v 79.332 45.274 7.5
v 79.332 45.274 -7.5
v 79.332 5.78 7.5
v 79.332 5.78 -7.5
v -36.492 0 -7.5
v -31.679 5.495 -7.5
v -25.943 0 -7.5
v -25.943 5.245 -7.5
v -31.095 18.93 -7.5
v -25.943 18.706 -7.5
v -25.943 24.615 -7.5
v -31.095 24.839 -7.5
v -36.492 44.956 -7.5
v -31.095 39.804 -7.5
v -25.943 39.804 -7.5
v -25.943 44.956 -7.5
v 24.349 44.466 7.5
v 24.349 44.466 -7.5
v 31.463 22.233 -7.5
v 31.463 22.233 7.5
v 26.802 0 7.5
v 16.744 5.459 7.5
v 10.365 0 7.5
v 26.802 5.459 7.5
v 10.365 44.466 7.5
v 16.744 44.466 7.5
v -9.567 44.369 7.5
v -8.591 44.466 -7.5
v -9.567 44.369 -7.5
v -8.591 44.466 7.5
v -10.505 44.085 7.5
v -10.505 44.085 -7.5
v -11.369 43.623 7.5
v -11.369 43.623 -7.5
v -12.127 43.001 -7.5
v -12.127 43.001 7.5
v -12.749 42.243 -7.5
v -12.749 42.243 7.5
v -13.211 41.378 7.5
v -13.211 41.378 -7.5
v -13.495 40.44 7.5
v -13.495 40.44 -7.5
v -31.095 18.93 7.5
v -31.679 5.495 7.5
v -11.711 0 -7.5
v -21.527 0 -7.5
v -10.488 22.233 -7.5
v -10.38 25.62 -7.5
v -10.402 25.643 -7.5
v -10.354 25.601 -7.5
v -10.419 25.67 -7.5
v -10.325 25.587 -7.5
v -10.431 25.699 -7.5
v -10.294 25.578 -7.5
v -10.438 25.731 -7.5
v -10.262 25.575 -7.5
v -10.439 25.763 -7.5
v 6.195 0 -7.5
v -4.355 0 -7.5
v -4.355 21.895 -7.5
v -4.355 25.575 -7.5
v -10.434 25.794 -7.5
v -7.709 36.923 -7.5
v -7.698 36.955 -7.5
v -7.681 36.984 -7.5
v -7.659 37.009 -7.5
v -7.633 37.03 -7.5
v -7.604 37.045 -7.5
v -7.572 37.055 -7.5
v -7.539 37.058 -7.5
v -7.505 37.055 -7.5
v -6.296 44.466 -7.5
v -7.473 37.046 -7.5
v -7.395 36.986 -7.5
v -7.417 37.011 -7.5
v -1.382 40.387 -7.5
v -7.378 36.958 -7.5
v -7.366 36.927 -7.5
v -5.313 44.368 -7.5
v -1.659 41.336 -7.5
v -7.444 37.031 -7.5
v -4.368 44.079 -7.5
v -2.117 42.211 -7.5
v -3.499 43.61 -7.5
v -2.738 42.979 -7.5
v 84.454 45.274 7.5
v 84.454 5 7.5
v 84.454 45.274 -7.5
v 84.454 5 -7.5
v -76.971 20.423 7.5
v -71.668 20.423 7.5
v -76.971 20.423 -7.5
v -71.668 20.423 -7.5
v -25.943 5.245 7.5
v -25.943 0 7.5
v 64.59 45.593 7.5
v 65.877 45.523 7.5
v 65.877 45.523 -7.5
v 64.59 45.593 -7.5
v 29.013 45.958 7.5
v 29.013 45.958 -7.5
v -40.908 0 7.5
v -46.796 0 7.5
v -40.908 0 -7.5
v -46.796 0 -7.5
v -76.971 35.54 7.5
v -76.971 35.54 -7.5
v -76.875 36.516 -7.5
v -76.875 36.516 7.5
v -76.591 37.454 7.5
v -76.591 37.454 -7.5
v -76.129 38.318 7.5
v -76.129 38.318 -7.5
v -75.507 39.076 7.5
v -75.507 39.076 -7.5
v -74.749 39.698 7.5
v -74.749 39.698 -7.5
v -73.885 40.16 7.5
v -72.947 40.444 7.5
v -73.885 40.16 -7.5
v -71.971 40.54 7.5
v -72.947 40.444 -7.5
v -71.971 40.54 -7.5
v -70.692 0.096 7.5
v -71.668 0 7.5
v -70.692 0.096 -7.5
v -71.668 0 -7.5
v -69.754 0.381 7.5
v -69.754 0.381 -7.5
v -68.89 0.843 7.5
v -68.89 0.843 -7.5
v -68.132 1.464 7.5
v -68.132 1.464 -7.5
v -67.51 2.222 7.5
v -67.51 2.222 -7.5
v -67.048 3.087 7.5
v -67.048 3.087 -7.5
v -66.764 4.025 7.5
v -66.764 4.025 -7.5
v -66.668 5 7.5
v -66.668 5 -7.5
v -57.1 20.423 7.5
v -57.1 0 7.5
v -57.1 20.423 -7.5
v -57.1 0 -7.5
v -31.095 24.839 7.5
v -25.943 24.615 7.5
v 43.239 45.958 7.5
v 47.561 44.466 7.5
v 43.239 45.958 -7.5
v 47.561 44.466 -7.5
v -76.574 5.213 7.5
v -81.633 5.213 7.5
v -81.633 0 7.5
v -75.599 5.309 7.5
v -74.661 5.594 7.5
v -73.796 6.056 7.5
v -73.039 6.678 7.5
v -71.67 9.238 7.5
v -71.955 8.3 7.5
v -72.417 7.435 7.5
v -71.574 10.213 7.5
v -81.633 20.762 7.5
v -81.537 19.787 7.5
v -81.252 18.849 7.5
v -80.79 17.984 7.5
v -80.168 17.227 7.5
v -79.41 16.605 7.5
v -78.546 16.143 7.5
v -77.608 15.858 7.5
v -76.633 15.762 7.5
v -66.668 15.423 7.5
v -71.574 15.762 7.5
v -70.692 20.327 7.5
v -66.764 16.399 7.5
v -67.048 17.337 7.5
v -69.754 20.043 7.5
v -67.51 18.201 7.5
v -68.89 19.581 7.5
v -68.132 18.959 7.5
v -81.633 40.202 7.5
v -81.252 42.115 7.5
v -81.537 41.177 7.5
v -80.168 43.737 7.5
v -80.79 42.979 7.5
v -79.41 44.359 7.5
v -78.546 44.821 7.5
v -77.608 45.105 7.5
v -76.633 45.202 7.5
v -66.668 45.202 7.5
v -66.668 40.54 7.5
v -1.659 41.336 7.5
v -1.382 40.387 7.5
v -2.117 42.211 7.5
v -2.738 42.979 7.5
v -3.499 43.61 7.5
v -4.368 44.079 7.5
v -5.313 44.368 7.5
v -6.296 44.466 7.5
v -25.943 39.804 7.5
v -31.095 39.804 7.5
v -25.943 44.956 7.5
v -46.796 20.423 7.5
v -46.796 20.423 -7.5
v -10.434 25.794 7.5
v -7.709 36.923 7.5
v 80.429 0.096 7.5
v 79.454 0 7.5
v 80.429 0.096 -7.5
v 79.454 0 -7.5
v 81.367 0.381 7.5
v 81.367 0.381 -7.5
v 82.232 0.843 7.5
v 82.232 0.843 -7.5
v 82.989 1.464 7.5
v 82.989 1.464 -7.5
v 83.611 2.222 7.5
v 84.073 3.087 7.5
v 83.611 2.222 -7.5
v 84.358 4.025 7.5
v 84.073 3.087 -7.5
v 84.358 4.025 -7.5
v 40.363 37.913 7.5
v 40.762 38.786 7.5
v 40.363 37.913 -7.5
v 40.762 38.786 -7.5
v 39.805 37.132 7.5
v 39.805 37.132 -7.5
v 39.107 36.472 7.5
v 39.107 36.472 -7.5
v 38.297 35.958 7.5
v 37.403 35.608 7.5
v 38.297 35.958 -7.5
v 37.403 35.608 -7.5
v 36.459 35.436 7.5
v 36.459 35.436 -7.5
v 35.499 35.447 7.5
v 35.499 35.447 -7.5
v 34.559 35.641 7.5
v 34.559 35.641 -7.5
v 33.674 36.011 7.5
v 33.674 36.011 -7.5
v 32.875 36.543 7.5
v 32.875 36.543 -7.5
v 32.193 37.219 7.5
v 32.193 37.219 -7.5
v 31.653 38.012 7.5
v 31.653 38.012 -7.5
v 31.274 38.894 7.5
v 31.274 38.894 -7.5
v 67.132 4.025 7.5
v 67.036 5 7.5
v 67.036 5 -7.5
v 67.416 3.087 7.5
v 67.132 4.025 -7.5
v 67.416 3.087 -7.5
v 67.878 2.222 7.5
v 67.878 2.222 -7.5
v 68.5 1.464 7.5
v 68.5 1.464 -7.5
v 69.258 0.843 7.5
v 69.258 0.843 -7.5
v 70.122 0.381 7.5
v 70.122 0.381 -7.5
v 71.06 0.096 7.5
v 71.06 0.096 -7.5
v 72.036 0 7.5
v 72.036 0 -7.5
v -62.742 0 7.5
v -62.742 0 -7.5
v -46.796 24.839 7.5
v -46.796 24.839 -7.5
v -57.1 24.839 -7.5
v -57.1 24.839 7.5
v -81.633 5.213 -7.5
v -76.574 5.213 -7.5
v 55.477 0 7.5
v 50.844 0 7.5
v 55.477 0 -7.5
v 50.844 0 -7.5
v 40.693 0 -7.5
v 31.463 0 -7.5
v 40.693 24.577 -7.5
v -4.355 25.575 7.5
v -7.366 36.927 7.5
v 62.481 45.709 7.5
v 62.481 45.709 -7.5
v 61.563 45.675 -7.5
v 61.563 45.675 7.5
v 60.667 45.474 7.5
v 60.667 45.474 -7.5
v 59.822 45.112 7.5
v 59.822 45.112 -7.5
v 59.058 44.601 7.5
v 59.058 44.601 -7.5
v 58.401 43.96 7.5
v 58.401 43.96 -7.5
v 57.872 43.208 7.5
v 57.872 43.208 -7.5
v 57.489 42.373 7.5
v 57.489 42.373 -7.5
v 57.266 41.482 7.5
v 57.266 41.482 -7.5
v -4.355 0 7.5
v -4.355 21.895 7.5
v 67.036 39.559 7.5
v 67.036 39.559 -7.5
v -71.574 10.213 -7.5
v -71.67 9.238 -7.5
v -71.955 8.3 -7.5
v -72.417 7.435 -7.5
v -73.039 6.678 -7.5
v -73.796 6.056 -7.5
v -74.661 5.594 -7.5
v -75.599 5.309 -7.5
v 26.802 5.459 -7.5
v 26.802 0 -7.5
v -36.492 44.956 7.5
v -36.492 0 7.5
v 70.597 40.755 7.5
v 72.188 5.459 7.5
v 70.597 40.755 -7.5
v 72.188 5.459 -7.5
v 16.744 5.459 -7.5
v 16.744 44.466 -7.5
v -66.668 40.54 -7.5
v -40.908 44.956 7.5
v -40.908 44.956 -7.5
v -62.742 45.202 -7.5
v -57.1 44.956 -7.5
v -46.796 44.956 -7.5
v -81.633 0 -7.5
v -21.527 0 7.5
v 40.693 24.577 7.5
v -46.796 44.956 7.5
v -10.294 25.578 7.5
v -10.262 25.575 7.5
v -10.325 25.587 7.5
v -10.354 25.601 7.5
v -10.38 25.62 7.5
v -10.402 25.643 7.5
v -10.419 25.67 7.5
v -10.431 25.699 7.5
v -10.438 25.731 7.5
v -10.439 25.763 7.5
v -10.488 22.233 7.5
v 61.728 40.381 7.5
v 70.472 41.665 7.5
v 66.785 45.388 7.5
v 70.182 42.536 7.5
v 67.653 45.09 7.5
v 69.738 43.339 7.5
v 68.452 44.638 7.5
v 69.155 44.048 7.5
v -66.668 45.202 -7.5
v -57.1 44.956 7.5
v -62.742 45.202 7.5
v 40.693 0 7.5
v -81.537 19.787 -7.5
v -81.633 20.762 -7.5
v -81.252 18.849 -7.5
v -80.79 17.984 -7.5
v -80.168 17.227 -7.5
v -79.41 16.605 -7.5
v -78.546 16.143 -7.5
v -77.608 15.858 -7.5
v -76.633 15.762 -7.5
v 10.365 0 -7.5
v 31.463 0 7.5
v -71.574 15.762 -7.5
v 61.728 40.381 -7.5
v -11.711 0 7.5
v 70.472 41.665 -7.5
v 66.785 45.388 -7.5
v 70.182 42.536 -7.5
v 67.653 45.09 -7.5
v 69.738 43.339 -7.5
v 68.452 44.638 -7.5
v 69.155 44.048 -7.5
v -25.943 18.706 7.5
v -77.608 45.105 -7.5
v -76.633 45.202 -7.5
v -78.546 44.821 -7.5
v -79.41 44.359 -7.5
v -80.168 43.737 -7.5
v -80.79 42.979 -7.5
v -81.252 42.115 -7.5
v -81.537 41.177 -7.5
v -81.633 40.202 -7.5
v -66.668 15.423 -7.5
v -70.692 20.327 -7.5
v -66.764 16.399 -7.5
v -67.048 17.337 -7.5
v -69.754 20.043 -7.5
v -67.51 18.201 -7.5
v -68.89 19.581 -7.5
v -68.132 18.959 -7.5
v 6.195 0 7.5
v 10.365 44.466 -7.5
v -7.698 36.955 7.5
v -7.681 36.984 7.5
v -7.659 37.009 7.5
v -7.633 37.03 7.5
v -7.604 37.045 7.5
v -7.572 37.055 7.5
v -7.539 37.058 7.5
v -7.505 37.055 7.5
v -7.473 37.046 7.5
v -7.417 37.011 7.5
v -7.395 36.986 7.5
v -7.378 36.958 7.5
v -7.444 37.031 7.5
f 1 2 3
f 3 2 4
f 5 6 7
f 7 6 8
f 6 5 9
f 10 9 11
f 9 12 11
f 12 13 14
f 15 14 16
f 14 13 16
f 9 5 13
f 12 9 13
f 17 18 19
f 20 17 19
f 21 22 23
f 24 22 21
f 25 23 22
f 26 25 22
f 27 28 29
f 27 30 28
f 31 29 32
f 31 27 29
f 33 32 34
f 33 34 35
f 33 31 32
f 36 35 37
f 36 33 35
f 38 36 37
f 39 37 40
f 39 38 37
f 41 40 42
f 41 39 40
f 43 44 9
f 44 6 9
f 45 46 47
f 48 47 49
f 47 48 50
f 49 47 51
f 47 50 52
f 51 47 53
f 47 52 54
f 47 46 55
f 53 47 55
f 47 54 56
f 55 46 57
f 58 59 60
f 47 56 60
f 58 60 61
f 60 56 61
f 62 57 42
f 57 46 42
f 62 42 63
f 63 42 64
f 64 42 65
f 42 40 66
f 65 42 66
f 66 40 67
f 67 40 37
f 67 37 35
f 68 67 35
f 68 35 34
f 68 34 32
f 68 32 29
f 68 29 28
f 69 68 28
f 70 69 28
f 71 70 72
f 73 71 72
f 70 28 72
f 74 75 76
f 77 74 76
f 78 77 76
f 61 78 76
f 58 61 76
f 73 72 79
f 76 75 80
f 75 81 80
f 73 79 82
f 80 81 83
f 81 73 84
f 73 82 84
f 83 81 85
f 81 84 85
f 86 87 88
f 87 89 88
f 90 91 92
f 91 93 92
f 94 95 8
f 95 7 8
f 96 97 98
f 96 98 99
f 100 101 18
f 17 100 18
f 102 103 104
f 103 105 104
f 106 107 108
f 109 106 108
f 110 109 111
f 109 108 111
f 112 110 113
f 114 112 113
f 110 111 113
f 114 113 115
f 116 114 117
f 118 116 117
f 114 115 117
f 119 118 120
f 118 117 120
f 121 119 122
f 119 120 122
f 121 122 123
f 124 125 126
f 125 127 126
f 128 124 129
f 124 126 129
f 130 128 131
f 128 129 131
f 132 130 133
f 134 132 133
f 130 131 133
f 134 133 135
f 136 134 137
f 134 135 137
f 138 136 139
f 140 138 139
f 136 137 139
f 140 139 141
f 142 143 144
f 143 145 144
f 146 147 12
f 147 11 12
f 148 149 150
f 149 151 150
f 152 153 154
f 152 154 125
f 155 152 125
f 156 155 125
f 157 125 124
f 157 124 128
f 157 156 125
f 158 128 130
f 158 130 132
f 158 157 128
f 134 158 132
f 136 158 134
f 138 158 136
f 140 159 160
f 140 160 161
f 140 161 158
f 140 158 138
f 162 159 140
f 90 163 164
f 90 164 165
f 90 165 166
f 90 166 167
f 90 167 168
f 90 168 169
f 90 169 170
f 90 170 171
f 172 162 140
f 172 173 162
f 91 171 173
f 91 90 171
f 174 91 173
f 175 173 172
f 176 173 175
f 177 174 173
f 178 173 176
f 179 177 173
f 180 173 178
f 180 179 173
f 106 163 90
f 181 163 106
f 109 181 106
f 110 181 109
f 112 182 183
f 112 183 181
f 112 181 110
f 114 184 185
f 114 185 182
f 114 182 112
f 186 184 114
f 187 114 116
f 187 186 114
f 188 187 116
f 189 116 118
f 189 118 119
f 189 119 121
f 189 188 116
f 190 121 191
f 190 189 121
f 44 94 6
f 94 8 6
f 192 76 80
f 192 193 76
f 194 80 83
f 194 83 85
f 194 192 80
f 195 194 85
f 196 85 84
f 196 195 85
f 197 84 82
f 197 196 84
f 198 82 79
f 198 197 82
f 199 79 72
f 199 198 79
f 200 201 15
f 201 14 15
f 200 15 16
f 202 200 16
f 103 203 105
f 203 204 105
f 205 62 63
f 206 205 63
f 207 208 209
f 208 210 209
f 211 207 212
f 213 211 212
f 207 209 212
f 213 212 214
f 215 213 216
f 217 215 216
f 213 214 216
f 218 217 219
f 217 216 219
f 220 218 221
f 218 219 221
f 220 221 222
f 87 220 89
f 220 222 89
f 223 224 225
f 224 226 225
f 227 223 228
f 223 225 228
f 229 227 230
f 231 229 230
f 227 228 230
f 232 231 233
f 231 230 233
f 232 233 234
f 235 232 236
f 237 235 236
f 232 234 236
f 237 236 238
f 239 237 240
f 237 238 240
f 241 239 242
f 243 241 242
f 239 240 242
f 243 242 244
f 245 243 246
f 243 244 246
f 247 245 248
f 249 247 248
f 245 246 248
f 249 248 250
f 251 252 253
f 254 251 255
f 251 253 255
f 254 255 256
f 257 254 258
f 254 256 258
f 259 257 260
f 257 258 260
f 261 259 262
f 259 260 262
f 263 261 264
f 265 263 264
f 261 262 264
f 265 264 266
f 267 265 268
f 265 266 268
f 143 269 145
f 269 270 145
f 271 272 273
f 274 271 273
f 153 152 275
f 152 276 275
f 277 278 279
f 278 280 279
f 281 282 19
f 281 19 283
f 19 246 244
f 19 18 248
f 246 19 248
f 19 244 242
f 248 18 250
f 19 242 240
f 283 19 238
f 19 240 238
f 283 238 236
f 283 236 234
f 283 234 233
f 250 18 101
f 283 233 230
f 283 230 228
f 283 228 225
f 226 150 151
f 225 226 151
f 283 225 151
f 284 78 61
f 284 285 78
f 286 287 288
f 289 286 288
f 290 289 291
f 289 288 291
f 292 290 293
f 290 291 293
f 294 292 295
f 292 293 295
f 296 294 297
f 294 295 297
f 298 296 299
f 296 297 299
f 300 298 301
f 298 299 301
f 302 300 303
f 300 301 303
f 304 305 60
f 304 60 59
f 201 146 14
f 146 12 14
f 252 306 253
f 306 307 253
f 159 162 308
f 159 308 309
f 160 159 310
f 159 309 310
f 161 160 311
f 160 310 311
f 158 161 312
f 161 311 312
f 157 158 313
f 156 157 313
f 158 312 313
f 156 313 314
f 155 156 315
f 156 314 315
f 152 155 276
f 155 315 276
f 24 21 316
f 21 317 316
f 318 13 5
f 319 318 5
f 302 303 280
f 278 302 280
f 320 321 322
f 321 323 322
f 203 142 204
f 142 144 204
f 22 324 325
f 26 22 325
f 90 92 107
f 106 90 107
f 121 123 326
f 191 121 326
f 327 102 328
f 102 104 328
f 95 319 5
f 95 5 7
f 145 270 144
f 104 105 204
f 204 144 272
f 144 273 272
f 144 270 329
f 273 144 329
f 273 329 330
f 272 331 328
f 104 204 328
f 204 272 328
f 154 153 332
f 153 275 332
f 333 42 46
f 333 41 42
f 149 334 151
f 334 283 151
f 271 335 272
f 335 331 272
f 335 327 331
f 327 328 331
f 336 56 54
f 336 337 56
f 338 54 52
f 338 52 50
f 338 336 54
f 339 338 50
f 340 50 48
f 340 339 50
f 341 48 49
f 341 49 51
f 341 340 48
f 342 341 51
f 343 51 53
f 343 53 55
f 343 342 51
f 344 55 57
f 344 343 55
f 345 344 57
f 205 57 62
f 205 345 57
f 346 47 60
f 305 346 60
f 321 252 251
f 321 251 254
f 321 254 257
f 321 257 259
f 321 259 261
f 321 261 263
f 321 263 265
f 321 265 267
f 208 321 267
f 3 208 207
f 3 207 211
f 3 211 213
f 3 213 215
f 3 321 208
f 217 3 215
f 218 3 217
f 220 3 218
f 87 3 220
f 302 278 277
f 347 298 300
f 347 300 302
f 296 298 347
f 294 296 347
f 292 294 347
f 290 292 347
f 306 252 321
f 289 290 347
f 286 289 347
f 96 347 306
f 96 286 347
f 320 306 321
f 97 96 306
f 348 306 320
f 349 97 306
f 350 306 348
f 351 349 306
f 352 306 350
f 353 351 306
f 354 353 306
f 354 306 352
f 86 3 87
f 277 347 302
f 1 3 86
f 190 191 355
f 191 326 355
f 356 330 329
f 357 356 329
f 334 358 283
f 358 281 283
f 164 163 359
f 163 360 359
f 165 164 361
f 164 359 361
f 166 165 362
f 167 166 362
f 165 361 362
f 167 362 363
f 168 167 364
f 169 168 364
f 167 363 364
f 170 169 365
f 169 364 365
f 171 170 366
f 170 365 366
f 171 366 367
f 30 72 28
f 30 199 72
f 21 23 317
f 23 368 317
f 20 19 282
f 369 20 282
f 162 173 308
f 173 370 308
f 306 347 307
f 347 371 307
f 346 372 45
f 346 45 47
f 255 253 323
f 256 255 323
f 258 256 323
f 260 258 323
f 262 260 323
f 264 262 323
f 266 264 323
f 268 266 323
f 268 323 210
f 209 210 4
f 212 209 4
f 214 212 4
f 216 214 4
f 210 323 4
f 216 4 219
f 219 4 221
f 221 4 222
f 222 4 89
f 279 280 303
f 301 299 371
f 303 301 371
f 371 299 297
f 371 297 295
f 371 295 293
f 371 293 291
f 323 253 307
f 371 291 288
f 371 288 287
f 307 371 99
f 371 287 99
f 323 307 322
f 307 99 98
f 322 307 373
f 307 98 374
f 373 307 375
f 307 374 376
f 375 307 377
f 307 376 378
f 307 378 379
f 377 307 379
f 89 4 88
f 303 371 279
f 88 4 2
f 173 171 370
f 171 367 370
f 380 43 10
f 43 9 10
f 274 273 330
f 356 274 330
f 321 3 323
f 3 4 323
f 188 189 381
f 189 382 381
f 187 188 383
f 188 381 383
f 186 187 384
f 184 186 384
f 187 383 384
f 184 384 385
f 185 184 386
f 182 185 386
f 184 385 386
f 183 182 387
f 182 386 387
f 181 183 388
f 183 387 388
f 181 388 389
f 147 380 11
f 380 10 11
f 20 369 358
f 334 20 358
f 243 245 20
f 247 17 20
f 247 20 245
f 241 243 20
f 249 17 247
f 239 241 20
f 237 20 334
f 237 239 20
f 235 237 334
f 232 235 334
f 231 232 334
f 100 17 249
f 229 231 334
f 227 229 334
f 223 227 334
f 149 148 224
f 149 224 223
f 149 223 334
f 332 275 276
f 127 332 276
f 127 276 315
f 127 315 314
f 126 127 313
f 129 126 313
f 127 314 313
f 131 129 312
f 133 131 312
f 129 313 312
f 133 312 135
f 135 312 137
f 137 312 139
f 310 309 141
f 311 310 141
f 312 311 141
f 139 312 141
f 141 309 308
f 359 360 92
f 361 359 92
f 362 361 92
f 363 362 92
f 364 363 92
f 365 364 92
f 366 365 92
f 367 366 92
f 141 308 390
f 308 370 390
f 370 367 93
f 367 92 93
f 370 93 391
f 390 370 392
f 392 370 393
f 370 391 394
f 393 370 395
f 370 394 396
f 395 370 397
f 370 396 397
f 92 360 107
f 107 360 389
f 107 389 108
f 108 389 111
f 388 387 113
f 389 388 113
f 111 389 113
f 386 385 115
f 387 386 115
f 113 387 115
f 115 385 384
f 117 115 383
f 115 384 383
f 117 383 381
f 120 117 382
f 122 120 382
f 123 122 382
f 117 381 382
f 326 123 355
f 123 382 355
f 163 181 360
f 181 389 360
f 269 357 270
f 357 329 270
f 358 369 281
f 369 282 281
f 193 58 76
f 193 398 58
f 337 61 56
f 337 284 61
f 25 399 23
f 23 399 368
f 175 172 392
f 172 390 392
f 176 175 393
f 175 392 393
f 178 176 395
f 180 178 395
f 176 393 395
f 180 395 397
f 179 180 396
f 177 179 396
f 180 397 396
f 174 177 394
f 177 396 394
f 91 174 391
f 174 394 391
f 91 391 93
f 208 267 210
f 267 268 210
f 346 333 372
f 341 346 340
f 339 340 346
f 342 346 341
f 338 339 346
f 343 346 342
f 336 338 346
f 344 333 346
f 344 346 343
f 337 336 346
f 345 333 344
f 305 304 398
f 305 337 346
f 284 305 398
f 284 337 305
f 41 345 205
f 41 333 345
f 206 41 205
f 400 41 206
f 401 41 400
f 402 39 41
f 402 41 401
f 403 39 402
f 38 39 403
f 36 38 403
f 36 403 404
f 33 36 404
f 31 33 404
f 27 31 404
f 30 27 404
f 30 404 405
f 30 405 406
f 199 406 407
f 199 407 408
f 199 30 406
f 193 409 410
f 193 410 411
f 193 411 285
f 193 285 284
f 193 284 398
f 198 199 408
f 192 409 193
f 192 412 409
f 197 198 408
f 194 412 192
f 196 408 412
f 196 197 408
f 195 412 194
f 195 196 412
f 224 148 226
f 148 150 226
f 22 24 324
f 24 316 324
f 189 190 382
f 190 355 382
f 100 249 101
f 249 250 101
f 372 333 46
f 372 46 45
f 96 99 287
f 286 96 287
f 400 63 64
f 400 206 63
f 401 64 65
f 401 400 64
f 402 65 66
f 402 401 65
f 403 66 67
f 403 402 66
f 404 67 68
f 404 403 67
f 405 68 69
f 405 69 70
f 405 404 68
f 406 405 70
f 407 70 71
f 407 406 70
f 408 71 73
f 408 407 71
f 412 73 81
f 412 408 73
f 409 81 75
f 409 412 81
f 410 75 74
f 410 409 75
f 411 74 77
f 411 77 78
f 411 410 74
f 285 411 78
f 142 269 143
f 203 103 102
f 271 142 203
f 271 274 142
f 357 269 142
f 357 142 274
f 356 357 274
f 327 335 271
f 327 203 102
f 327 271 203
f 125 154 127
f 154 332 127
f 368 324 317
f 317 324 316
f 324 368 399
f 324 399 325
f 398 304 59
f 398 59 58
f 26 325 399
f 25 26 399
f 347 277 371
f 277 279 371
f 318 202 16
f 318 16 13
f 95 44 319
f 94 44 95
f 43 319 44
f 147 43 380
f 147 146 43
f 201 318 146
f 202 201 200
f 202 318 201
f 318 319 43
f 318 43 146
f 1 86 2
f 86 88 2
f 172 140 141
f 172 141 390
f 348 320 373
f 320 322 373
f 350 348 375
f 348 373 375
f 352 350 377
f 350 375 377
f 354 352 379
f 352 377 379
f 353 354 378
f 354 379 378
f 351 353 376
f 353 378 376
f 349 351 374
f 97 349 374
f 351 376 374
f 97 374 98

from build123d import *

# Parameters (mm, degrees)
F1_DEPTH = 7.5


with BuildPart() as f1:
    # F0 (on Top) → F1 (new body, symmetric)
    with BuildSketch(Plane.XY):
        with BuildLine():
            Line((-71.971382, 40.540304), (-66.667646, 40.540304))
            Line((-66.667646, 40.540304), (-66.667646, 45.201521))
            Line((-66.667646, 45.201521), (-76.632599, 45.201521))
            ThreePointArc((-76.632599, 45.201521), (-80.168133, 43.737055), (-81.632599, 40.201521))
            Line((-81.632599, 40.201521), (-81.632599, 20.762268))
            ThreePointArc((-81.632599, 20.762268), (-80.168133, 17.226734), (-76.632599, 15.762268))
            Line((-76.632599, 15.762268), (-71.574181, 15.762268))
            Line((-71.574181, 15.762268), (-71.574181, 10.213201))
            ThreePointArc((-71.574181, 10.213201), (-73.038647, 6.677667), (-76.574181, 5.213201))
            Line((-76.574181, 5.213201), (-76.971382, 5.213201))
            Line((-76.971382, 5.213201), (-81.632599, 5.213201))
            Line((-81.632599, 5.213201), (-81.632599, 0))
            Line((-81.632599, 0), (-76.971382, 0))
            Line((-76.971382, 0), (-71.667646, 0))
            ThreePointArc((-71.667646, 0), (-68.132112, 1.464466), (-66.667646, 5))
            Line((-66.667646, 5), (-66.667646, 15.423483))
            ThreePointArc((-66.667646, 15.423483), (-68.132112, 18.959017), (-71.667646, 20.423483))
            Line((-71.667646, 20.423483), (-76.971382, 20.423483))
            Line((-76.971382, 20.423483), (-76.971382, 35.540304))
            ThreePointArc((-76.971382, 35.540304), (-75.506916, 39.075838), (-71.971382, 40.540304))
        make_face()
        Polygon((-57.099886, 44.956192), (-62.742412, 45.201521), (-62.742412, 0), (-57.099886, 0), (-57.099886, 20.423483), (-46.796147, 20.423483), (-46.796147, 0), (-40.908296, 0), (-40.908296, 24.839371), (-40.908296, 44.956192), (-46.796147, 44.956192), (-46.796147, 24.839371), (-57.099886, 24.839371), align=None)
        Polygon((-36.492407, 44.956192), (-36.492407, 0), (-25.943343, 0), (-25.943343, 5.245199), (-31.679373, 5.494594), (-31.095212, 18.930187), (-25.943343, 18.706191), (-25.943343, 24.615375), (-31.095212, 24.839371), (-31.095212, 39.804325), (-25.943343, 39.804325), (-25.943343, 44.956192), align=None)
        Polygon((10.365071, 44.465542), (10.365071, 0), (26.801987, 0), (26.801987, 5.458529), (16.743576, 5.458529), (16.743576, 44.465542), align=None)
        with BuildLine():
            Line((31.463202, 22.232771), (31.463202, 0))
            Line((31.463202, 0), (40.692977, 0))
            Line((40.692977, 0), (40.692977, 24.576596))
            Line((40.692977, 24.576596), (47.561201, 44.465542))
            Line((47.561201, 44.465542), (43.238901, 45.958156))
            Line((43.238901, 45.958156), (40.761999, 38.785564))
            ThreePointArc((40.761999, 38.785564), (35.978854, 35.417959), (31.273743, 38.893755))
            Line((31.273743, 38.893755), (29.013135, 45.958156))
            Line((29.013135, 45.958156), (24.348715, 44.465542))
            Line((24.348715, 44.465542), (31.463202, 22.232771))
        make_face()
        with BuildLine():
            Line((57.265584, 41.481854), (50.844043, 0))
            Line((50.844043, 0), (55.476588, 0))
            Line((55.476588, 0), (61.727664, 40.380689))
            Line((61.727664, 40.380689), (67.035638, 39.558996))
            Line((67.035638, 39.558996), (67.035638, 5))
            ThreePointArc((67.035638, 5), (68.500104, 1.464466), (72.035638, 0))
            Line((72.035638, 0), (79.453858, 0))
            ThreePointArc((79.453858, 0), (82.989392, 1.464466), (84.453858, 5))
            Line((84.453858, 5), (84.453858, 45.274242))
            Line((84.453858, 45.274242), (79.331704, 45.274242))
            Line((79.331704, 45.274242), (79.331704, 5.780474))
            Line((79.331704, 5.780474), (72.187506, 5.458529))
            Line((72.187506, 5.458529), (70.596896, 40.755299))
            ThreePointArc((70.596896, 40.755299), (69.154977, 44.048177), (65.876552, 45.522662))
            Line((65.876552, 45.522662), (64.590423, 45.5934))
            Line((64.590423, 45.5934), (62.481316, 45.709401))
            ThreePointArc((62.481316, 45.709401), (59.05836, 44.601245), (57.265584, 41.481854))
        make_face()
        with BuildLine():
            Line((-13.495309, 40.439617), (-21.527454, 0))
            Line((-21.527454, 0), (-11.710544, 0))
            Line((-11.710544, 0), (-10.487733, 22.232771))
            Line((-10.487733, 22.232771), (-4.354556, 21.895444))
            Line((-4.354556, 21.895444), (-4.354556, 0))
            Line((-4.354556, 0), (6.19451, 0))
            Line((6.19451, 0), (-1.381607, 40.387394))
            ThreePointArc((-1.381607, 40.387394), (-3.102872, 43.31322), (-6.295891, 44.465542))
            Line((-6.295891, 44.465542), (-8.59111, 44.465542))
            ThreePointArc((-8.59111, 44.465542), (-11.763618, 43.330149), (-13.495309, 40.439617))
        make_face()
        with BuildLine():
            Line((-10.434148, 25.794161), (-7.708646, 36.923296))
            ThreePointArc((-7.708646, 36.923296), (-7.53865, 37.058004), (-7.366105, 36.926578))
            Line((-7.366105, 36.926578), (-4.354556, 25.575353))
            Line((-4.354556, 25.575353), (-10.262459, 25.575353))
            ThreePointArc((-10.262459, 25.575353), (-10.401522, 25.642999), (-10.434148, 25.794161))
        make_face(mode=Mode.SUBTRACT)
    extrude(amount=F1_DEPTH, both=True)


solid = f1.part
